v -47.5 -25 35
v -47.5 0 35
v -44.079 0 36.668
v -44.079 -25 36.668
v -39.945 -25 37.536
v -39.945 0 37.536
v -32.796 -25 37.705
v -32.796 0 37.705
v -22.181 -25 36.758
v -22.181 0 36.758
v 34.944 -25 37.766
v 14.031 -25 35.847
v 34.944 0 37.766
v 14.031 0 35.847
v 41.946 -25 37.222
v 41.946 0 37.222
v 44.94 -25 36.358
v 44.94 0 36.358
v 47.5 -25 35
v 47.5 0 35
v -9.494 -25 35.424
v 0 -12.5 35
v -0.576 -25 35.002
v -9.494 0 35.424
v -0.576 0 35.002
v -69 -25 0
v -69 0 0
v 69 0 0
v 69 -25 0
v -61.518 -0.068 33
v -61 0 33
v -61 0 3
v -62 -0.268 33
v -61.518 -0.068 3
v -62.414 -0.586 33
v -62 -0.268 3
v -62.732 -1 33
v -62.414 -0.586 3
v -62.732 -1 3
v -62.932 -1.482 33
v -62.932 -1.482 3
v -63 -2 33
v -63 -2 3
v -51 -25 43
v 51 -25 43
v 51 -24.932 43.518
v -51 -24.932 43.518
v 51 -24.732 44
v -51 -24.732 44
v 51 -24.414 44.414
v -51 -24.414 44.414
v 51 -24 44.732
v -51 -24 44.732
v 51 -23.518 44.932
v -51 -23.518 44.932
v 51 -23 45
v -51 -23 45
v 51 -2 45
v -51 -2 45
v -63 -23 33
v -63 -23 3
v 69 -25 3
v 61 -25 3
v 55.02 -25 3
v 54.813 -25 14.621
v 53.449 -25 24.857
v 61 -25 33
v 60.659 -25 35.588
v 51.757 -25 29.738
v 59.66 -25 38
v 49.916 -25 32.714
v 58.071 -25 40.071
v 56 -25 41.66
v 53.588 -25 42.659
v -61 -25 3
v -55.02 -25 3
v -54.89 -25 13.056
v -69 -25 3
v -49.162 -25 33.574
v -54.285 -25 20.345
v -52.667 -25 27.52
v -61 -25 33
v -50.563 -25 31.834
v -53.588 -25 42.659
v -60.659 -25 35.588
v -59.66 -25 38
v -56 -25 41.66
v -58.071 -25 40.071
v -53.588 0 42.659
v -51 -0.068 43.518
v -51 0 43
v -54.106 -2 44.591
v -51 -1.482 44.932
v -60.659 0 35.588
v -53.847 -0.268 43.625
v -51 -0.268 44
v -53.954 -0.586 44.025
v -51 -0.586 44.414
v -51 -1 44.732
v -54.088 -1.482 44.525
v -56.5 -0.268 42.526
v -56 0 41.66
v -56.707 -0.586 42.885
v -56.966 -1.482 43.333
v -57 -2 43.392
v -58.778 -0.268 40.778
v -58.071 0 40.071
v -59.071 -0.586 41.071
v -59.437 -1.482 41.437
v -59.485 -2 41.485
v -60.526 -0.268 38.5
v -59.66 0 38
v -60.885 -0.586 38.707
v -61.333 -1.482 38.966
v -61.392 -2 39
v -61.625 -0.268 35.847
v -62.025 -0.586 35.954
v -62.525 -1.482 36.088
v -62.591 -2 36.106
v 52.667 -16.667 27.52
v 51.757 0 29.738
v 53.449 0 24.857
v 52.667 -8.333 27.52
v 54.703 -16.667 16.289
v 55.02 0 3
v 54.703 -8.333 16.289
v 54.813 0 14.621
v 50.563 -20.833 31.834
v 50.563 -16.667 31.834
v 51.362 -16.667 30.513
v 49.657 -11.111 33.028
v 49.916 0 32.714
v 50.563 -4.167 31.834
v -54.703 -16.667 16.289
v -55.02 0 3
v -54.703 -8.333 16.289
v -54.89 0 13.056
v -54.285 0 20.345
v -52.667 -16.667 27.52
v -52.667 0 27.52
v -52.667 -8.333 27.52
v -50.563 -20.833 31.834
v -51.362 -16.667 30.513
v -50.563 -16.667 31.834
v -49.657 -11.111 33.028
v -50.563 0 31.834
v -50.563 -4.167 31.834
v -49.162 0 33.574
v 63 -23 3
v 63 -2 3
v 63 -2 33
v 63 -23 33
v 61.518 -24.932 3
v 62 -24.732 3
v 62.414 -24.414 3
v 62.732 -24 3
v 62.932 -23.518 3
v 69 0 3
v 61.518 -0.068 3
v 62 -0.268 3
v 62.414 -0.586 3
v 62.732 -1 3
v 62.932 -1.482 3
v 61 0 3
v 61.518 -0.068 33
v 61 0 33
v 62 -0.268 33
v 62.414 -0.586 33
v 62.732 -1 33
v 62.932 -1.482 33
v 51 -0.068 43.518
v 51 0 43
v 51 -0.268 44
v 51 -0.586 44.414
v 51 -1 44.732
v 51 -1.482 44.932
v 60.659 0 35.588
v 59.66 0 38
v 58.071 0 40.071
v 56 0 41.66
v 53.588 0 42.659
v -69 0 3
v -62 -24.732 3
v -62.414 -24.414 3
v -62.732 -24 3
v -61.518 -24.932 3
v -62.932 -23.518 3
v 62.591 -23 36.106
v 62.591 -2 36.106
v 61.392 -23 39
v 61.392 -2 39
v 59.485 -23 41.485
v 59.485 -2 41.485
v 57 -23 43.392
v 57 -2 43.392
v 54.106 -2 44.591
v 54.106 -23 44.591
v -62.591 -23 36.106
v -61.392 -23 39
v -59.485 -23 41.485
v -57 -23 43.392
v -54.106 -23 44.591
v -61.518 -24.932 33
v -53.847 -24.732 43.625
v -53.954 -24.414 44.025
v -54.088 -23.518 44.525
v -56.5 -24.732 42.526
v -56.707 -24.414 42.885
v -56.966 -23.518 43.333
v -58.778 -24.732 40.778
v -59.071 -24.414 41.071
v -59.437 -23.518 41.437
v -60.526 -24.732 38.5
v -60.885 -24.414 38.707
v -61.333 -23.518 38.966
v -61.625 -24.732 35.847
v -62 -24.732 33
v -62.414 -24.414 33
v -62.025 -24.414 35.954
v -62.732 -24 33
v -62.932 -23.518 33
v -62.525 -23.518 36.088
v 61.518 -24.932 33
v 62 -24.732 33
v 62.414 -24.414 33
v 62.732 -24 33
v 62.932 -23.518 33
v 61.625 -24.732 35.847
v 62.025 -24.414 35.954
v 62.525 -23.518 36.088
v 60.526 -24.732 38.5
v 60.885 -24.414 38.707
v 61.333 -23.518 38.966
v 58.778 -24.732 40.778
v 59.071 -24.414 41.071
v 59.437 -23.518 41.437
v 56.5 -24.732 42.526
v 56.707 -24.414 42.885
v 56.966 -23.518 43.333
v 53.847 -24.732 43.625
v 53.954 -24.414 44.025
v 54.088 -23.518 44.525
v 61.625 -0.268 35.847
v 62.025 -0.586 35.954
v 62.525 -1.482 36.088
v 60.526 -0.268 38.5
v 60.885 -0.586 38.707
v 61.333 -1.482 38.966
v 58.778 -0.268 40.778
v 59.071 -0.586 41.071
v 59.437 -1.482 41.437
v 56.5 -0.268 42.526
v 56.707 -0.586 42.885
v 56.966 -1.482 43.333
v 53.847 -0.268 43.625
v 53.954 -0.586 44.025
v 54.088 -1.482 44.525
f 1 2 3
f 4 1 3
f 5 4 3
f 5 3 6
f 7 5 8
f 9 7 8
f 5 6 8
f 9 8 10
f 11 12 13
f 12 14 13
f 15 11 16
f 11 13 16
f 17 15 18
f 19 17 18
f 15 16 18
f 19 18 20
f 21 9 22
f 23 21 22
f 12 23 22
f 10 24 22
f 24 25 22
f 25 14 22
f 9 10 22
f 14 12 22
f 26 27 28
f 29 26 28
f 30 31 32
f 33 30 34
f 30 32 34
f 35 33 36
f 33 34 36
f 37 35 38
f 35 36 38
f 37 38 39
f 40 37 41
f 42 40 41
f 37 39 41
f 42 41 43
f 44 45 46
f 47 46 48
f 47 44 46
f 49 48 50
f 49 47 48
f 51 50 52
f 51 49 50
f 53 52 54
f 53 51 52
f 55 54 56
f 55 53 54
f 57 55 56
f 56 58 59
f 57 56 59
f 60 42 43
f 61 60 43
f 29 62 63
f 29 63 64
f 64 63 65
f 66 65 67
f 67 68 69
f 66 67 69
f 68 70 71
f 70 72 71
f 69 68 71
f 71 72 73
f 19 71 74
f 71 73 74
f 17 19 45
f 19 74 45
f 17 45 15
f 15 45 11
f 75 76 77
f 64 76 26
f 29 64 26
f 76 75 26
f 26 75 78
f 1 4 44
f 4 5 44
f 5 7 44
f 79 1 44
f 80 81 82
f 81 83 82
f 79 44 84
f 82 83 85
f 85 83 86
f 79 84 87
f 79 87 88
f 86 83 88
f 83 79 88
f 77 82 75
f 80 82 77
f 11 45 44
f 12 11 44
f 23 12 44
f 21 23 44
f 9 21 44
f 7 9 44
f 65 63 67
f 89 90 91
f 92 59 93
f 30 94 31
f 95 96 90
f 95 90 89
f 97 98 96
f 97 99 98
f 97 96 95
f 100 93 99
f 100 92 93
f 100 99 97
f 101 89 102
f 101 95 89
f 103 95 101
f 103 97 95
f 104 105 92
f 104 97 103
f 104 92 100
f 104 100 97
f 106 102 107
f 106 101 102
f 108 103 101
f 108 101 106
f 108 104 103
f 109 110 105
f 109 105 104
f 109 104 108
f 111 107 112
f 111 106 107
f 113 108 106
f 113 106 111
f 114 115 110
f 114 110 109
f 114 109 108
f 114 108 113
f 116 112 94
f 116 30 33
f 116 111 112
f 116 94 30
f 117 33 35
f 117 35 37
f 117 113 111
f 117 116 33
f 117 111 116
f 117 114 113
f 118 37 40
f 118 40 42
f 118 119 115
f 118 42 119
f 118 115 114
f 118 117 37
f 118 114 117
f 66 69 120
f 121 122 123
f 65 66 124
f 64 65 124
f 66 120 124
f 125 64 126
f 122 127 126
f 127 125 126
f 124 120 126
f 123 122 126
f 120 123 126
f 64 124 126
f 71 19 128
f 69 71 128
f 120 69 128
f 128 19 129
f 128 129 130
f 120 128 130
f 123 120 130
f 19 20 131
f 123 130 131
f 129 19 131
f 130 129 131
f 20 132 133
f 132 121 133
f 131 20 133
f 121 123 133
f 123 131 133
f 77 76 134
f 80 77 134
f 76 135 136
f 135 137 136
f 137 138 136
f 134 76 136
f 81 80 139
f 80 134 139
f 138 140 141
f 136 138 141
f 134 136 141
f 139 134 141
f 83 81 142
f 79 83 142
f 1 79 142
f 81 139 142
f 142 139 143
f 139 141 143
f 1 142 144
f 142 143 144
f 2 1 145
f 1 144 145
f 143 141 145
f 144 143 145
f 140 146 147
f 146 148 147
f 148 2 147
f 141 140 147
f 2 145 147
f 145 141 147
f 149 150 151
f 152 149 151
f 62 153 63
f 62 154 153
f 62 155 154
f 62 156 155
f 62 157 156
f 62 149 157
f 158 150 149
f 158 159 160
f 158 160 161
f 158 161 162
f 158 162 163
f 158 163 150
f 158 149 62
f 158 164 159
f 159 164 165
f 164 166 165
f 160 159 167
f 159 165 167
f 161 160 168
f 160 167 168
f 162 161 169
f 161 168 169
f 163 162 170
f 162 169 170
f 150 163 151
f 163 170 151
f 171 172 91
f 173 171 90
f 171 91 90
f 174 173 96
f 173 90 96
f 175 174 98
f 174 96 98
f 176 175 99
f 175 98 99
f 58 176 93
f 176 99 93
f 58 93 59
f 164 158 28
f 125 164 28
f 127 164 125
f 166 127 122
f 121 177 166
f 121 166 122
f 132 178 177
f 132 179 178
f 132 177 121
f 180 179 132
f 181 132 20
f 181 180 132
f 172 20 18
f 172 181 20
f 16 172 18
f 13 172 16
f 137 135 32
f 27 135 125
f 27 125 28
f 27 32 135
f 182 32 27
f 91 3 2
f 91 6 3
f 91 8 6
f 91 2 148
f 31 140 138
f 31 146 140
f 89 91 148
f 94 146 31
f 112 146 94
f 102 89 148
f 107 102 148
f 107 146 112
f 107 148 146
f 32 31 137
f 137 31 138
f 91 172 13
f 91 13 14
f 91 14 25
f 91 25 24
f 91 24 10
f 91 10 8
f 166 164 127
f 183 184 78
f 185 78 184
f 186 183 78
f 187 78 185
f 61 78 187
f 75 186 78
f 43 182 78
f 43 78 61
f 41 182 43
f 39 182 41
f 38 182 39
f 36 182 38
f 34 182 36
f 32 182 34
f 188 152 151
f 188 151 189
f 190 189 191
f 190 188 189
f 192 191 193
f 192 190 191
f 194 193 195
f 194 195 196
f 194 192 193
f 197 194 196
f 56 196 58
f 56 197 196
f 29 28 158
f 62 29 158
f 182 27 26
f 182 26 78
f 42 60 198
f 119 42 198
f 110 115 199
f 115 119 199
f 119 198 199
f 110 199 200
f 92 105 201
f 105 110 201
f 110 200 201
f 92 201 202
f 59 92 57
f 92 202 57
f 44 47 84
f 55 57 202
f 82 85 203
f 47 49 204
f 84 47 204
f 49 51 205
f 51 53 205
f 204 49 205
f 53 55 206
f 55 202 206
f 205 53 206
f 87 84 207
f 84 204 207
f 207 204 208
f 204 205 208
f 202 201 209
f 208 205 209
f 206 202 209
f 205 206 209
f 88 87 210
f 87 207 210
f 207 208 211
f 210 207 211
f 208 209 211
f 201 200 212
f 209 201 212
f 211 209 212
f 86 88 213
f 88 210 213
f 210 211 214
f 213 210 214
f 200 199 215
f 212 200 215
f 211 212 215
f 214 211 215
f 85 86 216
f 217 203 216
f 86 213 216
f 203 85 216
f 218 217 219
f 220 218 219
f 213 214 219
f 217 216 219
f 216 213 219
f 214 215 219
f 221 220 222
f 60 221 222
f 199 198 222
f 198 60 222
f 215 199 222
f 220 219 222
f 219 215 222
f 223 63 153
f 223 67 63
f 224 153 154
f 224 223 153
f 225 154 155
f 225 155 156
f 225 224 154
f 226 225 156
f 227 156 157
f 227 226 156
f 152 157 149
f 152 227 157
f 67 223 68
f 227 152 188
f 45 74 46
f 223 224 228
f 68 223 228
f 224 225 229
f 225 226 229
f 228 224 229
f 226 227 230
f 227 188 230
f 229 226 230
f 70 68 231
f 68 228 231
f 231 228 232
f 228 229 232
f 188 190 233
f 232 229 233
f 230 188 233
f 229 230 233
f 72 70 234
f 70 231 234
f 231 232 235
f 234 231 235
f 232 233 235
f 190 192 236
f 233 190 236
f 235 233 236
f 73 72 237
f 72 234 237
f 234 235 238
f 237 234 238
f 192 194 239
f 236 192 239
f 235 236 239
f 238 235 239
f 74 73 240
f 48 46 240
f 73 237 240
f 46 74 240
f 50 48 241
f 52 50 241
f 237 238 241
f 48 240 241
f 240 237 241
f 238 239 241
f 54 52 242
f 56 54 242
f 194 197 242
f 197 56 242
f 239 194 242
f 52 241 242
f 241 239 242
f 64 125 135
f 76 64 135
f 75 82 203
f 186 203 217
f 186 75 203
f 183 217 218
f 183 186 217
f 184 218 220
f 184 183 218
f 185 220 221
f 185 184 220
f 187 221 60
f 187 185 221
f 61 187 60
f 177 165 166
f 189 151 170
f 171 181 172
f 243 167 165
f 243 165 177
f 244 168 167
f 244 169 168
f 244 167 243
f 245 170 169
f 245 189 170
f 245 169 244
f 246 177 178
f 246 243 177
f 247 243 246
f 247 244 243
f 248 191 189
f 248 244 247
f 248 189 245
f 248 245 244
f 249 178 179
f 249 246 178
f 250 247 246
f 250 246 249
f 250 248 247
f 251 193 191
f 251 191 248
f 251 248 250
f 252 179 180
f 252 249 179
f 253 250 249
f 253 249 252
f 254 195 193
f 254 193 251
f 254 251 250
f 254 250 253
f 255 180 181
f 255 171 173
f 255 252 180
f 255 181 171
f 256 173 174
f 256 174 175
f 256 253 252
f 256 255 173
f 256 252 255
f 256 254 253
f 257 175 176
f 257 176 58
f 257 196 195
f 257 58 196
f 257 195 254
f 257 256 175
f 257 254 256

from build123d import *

# Parameters (mm, degrees)
F0_W     = 6
F0_H     = 3
F1_DEPTH = 25
F2_R     = 12
F3_R     = 2


with BuildPart() as f1:
    # F0 (on Front) → F1 (new body)
    with BuildSketch(Plane.XZ):
        with BuildLine():
            add(Edge.make_bspline(
                [(-55, 0), (-55.0076209993, 1.0009689247), (-55.0152419987, 2.0019378493), (-55.0204363014, 3)],
                knots=[0, 0, 0, 0, 0.0157183213, 0.0157183213, 0.0157183213, 0.0157183213], degree=3))
            Line((-55, 0), (55, 0))
            add(Edge.make_bspline(
                [(55.0204363014, 3), (55.0152419987, 2.0019378493), (55.0076209993, 1.0009689247), (55, 0)],
                knots=[0.9842816787, 0.9842816787, 0.9842816787, 0.9842816787, 1, 1, 1, 1], degree=3))
            Line((55.0204363014, 3), (-55.0204363014, 3))
        make_face()
        with BuildLine():
            Line((-63, 0), (-55, 0))
            add(Edge.make_bspline(
                [(-55, 0), (-55.0076209993, 1.0009689247), (-55.0152419987, 2.0019378493), (-55.0204363014, 3)],
                knots=[0, 0, 0, 0, 0.0157183213, 0.0157183213, 0.0157183213, 0.0157183213], degree=3))
            Line((-55.0204363014, 3), (-63, 3))
            Line((-63, 3), (-63, 0))
        make_face()
        with BuildLine():
            add(Edge.make_bspline(
                [(55.0204363014, 3), (55.0152419987, 2.0019378493), (55.0076209993, 1.0009689247), (55, 0)],
                knots=[0.9842816787, 0.9842816787, 0.9842816787, 0.9842816787, 1, 1, 1, 1], degree=3))
            Line((55, 0), (63, 0))
            Line((63, 0), (63, 3))
            Line((63, 3), (55.0204363014, 3))
        make_face()
        with BuildLine():
            Line((-63, 3), (-55.0204363014, 3))
            add(Edge.make_bspline(
                [(-55.0204363014, 3), (-55.0920234657, 16.7551548981), (-54.7026845561, 29.9581979592), (-47.5, 35)],
                knots=[0.0157183213, 0.0157183213, 0.0157183213, 0.0157183213, 0.2323460581, 0.2323460581, 0.2323460581, 0.2323460581], degree=3))
            add(Edge.make_bspline(
                [(-47.5, 35), (-38.6007383304, 41.229387848), (-19.3003691017, 34.9999999795), (1.271e-07, 35)],
                knots=[0.2323460581, 0.2323460581, 0.2323460581, 0.2323460581, 0.5, 0.5, 0.5, 0.5], degree=3))
            add(Edge.make_bspline(
                [(1.271e-07, 35), (19.3003692287, 35.0000000205), (38.60073836, 41.2293878575), (47.5000000137, 35.0000000044)],
                knots=[0.5, 0.5, 0.5, 0.5, 0.7676539419, 0.7676539419, 0.7676539419, 0.7676539419], degree=3))
            add(Edge.make_bspline(
                [(47.5, 35), (54.7026845561, 29.9581979592), (55.0920234657, 16.7551548981), (55.0204363014, 3)],
                knots=[0.7676539419, 0.7676539419, 0.7676539419, 0.7676539419, 0.9842816787, 0.9842816787, 0.9842816787, 0.9842816787], degree=3))
            Line((55.0204363014, 3), (63, 3))
            Line((63, 3), (63, 45))
            Line((63, 45), (-63, 45))
            Line((-63, 45), (-63, 3))
        make_face()
        with Locations((-66, 1.5)):
            Rectangle(F0_W, F0_H)
        with Locations((66, 1.5)):
            Rectangle(F0_W, F0_H)
    extrude(amount=F1_DEPTH)

    # F2
    f2_edges = [f1.edges().sort_by_distance(p)[0] for p in [
        (-63, -12.5, 45),
        (63, -12.5, 45),
    ]]
    fillet(f2_edges, radius=F2_R)

    # F3
    f3_edges = [f1.edges().sort_by_distance(p)[0] for p in [
        (0, 0, 45),
        (-59.485281, 0, 41.485281),
        (-63, 0, 18),
        (59.485281, 0, 41.485281),
        (63, 0, 18),
        (-63, -25, 18),
        (-59.485281, -25, 41.485281),
        (0, -25, 45),
        (59.485281, -25, 41.485281),
        (63, -25, 18),
    ]]
    fillet(f3_edges, radius=F3_R)


solid = f1.part
